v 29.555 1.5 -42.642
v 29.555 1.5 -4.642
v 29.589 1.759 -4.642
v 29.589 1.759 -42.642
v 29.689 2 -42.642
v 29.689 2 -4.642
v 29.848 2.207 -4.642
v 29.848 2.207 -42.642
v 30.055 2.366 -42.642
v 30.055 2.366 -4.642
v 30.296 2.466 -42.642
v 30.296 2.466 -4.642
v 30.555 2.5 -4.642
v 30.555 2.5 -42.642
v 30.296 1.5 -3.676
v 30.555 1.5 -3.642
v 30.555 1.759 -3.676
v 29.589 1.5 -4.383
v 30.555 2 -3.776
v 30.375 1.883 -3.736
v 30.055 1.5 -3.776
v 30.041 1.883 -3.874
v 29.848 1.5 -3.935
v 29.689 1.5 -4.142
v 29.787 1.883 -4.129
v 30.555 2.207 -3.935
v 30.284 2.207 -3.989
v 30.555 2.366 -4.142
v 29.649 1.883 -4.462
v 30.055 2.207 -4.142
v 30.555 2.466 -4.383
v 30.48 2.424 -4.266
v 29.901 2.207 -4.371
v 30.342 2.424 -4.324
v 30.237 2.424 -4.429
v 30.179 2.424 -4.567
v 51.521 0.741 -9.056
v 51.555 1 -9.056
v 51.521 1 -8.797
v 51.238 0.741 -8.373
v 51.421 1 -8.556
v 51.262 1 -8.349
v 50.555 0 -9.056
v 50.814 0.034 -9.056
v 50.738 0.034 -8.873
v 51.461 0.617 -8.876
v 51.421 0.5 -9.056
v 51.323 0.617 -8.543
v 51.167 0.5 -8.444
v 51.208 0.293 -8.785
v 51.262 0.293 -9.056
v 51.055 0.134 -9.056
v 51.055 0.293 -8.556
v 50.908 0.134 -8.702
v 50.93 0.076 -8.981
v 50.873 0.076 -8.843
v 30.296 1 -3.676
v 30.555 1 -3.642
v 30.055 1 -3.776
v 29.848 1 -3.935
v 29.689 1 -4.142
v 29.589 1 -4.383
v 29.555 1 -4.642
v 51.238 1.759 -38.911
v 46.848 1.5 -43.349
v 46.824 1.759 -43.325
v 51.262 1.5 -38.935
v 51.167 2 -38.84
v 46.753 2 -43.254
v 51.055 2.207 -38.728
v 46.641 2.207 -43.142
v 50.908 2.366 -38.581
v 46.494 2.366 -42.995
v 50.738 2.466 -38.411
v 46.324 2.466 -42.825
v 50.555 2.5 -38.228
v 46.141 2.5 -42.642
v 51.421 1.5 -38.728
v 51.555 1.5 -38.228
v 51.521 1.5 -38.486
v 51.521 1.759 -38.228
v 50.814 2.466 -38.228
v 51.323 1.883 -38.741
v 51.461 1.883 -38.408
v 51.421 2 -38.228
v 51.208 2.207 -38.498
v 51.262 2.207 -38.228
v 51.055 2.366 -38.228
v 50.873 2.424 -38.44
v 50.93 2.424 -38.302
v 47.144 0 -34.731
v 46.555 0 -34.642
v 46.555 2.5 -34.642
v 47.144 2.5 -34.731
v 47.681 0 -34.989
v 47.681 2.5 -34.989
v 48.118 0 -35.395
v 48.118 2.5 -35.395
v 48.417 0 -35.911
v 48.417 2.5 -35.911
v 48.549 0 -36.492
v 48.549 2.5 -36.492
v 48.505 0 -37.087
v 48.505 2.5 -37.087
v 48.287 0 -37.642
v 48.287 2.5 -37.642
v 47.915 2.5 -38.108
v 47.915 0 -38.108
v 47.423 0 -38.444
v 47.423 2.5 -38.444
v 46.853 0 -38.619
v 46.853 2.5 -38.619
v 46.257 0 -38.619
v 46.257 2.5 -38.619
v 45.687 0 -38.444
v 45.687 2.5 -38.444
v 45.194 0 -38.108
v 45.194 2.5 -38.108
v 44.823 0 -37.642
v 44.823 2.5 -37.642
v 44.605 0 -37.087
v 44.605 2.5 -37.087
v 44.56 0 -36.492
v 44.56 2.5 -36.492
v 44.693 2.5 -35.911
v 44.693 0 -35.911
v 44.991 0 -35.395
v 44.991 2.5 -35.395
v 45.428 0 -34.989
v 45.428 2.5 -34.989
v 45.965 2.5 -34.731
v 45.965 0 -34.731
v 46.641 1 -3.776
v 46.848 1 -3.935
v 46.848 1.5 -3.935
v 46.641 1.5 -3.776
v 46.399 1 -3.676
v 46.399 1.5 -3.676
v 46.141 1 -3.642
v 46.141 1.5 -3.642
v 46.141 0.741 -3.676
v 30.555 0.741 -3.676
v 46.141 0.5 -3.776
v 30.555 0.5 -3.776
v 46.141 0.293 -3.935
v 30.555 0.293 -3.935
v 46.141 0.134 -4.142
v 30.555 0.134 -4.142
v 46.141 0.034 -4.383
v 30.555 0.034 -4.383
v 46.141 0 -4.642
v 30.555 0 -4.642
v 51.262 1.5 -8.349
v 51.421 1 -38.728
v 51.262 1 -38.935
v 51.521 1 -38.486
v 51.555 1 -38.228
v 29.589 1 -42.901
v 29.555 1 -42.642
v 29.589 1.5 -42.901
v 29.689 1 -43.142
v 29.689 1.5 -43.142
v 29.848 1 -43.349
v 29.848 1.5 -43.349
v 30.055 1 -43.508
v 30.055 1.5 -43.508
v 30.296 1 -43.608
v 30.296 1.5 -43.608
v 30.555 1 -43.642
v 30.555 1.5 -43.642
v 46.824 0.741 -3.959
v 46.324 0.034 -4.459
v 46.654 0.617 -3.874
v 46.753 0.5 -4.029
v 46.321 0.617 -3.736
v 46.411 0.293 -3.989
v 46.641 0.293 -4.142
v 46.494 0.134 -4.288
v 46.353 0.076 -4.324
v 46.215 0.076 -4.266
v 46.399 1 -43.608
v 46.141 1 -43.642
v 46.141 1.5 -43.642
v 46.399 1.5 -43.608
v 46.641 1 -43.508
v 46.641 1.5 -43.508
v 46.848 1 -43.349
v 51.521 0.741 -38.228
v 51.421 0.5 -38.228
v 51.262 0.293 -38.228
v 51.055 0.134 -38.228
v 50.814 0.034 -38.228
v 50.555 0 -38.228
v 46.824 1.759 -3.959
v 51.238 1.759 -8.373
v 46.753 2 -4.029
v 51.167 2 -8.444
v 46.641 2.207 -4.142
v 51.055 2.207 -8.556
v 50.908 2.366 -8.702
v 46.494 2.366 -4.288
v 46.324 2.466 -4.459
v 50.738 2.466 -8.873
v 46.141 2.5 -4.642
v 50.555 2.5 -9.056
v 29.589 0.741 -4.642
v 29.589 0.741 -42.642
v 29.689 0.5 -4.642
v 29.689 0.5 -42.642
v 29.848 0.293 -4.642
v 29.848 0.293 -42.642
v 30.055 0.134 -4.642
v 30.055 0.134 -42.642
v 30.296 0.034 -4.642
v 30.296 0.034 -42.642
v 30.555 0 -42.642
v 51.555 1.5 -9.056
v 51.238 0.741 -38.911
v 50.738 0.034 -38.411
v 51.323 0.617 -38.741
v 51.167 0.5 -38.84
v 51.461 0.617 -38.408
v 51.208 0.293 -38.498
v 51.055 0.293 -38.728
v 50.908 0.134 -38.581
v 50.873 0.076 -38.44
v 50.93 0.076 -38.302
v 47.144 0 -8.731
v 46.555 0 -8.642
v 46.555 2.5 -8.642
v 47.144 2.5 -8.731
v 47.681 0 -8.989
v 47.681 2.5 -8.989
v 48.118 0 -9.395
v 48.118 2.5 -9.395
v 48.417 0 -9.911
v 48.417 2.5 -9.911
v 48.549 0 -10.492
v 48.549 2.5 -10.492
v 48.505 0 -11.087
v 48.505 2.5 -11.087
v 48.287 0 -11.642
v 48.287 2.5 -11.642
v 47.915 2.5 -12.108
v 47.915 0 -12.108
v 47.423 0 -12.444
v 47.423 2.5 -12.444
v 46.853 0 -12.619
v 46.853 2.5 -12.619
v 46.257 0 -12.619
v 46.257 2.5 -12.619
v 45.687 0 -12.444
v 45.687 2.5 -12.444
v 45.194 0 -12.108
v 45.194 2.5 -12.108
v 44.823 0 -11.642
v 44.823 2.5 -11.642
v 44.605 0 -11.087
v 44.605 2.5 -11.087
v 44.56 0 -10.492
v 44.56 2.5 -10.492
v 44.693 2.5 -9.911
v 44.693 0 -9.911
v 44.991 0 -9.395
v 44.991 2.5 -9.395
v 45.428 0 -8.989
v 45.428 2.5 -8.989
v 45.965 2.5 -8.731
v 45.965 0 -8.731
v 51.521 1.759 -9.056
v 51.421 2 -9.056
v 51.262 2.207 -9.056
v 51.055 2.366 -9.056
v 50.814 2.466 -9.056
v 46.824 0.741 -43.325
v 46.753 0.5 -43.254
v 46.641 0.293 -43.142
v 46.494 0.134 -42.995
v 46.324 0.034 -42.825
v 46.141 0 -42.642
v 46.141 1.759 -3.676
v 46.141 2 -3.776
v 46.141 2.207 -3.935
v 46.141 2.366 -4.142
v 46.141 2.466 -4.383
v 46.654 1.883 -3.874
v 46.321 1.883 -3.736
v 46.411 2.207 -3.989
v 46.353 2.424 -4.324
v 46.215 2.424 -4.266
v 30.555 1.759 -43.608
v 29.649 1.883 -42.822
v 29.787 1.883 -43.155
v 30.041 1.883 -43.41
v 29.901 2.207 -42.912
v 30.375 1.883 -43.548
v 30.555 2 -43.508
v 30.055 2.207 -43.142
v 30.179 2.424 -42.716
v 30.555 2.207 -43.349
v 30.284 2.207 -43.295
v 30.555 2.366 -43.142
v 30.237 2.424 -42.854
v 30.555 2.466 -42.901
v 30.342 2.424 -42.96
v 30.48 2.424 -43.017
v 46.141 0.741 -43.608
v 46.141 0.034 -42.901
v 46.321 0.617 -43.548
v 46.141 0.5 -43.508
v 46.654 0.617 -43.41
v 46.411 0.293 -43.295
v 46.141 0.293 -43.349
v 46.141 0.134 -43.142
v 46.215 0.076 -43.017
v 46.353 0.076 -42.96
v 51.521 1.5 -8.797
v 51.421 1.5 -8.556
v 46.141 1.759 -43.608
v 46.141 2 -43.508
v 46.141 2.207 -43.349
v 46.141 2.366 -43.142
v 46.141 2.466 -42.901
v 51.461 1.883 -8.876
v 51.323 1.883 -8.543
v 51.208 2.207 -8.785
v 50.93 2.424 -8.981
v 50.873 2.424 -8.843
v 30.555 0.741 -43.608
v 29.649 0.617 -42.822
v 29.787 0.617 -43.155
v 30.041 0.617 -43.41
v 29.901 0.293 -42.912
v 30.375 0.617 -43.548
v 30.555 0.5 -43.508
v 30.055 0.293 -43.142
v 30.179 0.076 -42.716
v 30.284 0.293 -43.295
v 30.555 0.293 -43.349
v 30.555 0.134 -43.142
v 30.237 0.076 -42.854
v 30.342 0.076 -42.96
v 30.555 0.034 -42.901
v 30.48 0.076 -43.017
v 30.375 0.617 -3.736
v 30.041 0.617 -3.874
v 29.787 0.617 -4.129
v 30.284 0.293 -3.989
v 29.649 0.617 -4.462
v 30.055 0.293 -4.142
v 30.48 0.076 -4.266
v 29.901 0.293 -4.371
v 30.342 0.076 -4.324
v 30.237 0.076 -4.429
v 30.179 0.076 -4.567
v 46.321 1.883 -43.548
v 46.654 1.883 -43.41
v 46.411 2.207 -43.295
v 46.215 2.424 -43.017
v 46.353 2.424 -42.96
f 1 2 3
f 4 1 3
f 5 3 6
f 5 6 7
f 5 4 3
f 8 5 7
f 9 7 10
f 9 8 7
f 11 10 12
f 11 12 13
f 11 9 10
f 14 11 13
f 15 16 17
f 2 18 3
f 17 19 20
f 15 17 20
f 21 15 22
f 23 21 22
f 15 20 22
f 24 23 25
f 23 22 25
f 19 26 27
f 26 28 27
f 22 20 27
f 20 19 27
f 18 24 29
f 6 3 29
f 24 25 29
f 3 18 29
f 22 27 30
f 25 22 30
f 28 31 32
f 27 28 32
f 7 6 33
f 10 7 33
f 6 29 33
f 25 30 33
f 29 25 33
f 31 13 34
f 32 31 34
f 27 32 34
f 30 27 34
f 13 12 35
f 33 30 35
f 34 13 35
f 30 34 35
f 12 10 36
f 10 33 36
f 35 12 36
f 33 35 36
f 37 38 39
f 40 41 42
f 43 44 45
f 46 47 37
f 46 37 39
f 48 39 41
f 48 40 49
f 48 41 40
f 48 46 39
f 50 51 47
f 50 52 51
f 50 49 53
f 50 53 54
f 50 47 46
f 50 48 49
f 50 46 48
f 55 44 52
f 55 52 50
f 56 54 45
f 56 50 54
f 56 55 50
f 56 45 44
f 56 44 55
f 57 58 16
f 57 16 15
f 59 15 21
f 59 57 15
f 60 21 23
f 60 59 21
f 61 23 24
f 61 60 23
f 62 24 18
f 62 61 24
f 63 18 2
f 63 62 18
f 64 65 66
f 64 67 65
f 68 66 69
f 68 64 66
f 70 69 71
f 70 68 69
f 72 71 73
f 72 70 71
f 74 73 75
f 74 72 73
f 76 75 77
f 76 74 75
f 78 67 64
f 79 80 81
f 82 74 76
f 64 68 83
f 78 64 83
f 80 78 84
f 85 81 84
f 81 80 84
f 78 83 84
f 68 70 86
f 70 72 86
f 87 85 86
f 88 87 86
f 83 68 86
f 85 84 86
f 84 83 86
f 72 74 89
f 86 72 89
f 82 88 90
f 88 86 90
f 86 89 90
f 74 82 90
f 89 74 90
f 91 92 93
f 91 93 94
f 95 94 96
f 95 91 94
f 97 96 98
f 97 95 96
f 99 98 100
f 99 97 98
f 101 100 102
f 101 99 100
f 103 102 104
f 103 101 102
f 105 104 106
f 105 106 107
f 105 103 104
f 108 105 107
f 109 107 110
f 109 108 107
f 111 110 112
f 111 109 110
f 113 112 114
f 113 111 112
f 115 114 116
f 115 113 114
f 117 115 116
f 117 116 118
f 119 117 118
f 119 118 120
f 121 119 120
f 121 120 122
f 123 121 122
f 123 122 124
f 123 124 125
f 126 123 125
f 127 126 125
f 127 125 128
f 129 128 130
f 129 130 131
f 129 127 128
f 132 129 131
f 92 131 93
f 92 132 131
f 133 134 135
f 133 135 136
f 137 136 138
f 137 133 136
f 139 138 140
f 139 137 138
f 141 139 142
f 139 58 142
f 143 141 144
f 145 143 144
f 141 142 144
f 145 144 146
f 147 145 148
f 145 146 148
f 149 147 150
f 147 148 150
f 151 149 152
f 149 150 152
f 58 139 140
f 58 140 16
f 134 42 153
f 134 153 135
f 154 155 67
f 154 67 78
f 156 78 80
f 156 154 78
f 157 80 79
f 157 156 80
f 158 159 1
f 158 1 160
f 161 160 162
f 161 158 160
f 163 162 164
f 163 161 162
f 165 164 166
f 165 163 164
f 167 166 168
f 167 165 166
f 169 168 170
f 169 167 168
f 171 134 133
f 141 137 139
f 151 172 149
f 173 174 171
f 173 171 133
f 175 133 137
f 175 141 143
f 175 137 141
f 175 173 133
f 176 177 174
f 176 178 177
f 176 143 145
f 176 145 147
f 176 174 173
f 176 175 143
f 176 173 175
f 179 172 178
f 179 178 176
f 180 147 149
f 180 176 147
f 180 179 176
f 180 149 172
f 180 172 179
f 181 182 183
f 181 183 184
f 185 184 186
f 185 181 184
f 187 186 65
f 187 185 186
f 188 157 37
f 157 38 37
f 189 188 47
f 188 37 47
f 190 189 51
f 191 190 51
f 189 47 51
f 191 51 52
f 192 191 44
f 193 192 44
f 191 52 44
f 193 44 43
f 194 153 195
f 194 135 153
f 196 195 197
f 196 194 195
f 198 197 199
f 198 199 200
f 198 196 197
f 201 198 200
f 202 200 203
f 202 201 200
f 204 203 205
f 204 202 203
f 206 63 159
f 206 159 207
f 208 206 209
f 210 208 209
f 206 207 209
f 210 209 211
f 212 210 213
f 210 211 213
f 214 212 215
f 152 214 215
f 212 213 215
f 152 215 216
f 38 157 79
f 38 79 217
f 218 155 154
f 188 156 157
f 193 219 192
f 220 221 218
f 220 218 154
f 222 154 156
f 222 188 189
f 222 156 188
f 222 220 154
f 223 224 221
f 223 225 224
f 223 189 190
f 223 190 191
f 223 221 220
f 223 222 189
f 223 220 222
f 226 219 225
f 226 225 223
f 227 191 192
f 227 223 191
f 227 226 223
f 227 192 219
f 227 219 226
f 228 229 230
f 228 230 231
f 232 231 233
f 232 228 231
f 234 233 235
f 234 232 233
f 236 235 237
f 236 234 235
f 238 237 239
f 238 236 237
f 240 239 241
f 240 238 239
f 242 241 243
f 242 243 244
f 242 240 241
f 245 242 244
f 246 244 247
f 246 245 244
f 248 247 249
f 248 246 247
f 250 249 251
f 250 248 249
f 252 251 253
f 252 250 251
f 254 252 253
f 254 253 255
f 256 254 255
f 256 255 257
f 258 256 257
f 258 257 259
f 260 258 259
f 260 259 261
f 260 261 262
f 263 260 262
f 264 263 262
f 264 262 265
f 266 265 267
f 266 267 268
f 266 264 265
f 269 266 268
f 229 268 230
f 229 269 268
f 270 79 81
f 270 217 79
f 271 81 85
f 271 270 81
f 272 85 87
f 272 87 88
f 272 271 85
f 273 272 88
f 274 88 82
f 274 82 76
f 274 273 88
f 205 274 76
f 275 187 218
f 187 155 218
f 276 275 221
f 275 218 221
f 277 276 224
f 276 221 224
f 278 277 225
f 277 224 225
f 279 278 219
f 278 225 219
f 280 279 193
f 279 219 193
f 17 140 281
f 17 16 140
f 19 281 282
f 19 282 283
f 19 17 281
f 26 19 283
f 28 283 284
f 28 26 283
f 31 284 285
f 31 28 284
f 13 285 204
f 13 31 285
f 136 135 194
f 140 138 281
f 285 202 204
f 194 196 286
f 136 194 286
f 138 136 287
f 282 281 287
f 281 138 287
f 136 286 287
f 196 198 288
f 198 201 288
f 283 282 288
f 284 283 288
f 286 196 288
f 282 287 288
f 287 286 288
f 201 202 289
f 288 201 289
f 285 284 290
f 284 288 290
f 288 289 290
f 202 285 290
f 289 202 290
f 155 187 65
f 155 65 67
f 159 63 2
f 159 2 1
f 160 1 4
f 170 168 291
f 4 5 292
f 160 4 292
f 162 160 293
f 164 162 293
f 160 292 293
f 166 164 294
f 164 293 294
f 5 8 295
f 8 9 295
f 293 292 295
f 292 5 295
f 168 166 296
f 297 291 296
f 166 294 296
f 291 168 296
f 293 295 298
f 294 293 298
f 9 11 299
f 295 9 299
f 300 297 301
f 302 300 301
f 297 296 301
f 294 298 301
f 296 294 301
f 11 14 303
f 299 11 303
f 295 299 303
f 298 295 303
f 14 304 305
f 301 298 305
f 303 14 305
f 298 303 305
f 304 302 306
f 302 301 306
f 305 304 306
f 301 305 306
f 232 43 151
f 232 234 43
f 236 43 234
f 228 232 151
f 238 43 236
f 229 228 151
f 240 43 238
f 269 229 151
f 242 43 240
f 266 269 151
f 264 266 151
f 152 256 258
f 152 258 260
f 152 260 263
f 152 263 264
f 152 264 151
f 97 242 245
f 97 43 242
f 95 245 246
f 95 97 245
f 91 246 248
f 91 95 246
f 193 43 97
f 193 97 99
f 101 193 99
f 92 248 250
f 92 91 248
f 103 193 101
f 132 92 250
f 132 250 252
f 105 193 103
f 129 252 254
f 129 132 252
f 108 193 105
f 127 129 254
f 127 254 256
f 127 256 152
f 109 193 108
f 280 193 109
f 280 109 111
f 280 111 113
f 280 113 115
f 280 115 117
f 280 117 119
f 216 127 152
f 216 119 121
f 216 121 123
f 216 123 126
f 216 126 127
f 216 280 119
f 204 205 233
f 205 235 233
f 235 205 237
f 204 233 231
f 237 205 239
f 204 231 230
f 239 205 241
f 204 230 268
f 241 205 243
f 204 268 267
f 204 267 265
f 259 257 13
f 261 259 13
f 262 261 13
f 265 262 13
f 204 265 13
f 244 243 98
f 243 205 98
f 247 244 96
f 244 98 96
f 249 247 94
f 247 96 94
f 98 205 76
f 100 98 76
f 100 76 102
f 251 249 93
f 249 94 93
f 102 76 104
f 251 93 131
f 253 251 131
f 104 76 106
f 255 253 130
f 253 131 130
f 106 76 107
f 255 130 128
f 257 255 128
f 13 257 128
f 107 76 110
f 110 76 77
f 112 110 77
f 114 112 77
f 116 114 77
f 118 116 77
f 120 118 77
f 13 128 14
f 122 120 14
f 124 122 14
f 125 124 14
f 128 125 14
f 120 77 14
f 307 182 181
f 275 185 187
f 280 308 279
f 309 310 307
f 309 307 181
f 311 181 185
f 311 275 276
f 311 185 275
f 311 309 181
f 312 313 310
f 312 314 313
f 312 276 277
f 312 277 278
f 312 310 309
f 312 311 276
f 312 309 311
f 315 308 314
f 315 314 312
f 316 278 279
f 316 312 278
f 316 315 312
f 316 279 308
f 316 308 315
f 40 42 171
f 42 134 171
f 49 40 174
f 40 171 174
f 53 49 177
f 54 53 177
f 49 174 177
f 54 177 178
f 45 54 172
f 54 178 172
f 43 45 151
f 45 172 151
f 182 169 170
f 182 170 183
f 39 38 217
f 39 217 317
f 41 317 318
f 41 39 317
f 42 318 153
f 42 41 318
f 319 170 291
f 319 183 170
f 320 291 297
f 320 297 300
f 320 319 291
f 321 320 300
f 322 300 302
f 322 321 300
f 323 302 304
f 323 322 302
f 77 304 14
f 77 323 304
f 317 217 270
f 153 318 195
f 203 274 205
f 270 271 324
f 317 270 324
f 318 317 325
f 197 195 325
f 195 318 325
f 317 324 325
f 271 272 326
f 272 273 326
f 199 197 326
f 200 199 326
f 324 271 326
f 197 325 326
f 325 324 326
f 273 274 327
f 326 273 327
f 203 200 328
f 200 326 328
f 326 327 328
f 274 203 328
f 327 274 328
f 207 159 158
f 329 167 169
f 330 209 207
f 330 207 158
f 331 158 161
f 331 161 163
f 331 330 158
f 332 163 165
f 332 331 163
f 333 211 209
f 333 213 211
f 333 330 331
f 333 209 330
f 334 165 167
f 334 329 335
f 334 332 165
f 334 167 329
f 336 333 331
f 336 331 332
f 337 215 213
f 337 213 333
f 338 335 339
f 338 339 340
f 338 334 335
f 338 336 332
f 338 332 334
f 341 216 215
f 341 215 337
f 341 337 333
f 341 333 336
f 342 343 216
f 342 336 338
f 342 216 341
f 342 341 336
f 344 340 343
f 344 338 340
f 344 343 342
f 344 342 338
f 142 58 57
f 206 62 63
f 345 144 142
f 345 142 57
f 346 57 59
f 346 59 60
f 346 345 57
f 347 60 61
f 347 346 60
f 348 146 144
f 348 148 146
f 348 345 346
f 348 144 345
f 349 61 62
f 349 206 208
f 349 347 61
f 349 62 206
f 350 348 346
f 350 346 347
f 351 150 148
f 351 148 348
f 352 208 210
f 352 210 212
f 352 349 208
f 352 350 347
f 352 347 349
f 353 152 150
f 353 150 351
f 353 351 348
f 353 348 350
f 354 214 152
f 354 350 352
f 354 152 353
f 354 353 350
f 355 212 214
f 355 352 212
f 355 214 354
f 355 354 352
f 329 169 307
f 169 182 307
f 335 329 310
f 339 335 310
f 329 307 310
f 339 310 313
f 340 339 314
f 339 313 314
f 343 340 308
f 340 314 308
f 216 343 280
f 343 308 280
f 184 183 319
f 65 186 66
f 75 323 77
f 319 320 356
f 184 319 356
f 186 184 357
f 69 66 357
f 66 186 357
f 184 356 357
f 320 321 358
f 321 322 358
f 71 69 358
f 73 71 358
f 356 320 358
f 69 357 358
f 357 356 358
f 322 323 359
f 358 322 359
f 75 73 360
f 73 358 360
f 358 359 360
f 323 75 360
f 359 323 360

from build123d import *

# Parameters (mm, degrees)
SKETCH_1_R      = 2
EXTRUDE_1_DEPTH = 2.5
FILLET_1_R      = 1


with BuildPart() as part:
    # 草图1 → 凸台-拉伸1 (new body)
    with BuildSketch(Plane(origin=(0, 0, 0), x_dir=(1, 0, 0), z_dir=(0, 1, 0))):
        with BuildLine():
            Line((29.554766525, 4.641792145), (29.554766525, 7.641792145))
            Line((29.554766525, 7.641792145), (29.554766525, 42.641792145))
            ThreePointArc((29.554766525, 42.641792145), (29.847659744, 43.348898926), (30.554766525, 43.641792145))
            Line((30.554766525, 43.641792145), (46.140552963, 43.641792145))
            ThreePointArc((46.140552963, 43.641792145), (46.523236395, 43.565671677), (46.847659744, 43.348898926))
            Line((46.847659744, 43.348898926), (51.261873307, 38.934685364))
            ThreePointArc((51.261873307, 38.934685364), (51.478646058, 38.610262015), (51.554766525, 38.227578582))
            Line((51.554766525, 38.227578582), (51.554766525, 31.641792145))
            Line((51.554766525, 31.641792145), (51.554766525, 15.641792145))
            Line((51.554766525, 15.641792145), (51.554766525, 9.056005707))
            ThreePointArc((51.554766525, 9.056005707), (51.478646058, 8.673322275), (51.261873307, 8.348898926))
            Line((51.261873307, 8.348898926), (46.847659744, 3.934685364))
            ThreePointArc((46.847659744, 3.934685364), (46.523236395, 3.717912612), (46.140552963, 3.641792145))
            Line((46.140552963, 3.641792145), (30.554766525, 3.641792145))
            ThreePointArc((30.554766525, 3.641792145), (29.847659744, 3.934685364), (29.554766525, 4.641792145))
        make_face()
        with Locations(Location((46.554766525, 10.641792145, 0), (0, 0, 270))):
            Circle(SKETCH_1_R, mode=Mode.SUBTRACT)
        with Locations(Location((46.554766525, 36.641792145, 0), (0, 0, 270))):
            Circle(SKETCH_1_R, mode=Mode.SUBTRACT)
    extrude(amount=EXTRUDE_1_DEPTH)

    # 圆角1
    fillet_1_edges = [part.edges().sort_by_distance(p)[0] for p in [
        (29.847659744, 2.5, -3.934685364),
        (29.847659744, 0, -43.348898926),
        (38.347659744, 0, -43.641792145),
        (46.523236395, 0, -43.565671677),
        (49.054766525, 0, -41.141792145),
        (51.478646058, 0, -38.610262015),
        (51.554766525, 0, -23.641792145),
        (38.347659744, 2.5, -3.641792145),
        (51.478646058, 0, -8.673322275),
        (49.054766525, 0, -6.141792145),
        (46.523236395, 0, -3.717912612),
        (38.347659744, 0, -3.641792145),
        (29.847659744, 0, -3.934685364),
        (29.554766525, 0, -23.641792145),
        (46.523236395, 2.5, -3.717912612),
        (49.054766525, 2.5, -6.141792145),
        (51.478646058, 2.5, -8.673322275),
        (51.554766525, 2.5, -23.641792145),
        (51.478646058, 2.5, -38.610262015),
        (49.054766525, 2.5, -41.141792145),
        (29.554766525, 2.5, -23.641792145),
        (46.523236395, 2.5, -43.565671677),
        (38.347659744, 2.5, -43.641792145),
        (29.847659744, 2.5, -43.348898926),
    ]]
    fillet(fillet_1_edges, radius=FILLET_1_R)


solid = part.part
